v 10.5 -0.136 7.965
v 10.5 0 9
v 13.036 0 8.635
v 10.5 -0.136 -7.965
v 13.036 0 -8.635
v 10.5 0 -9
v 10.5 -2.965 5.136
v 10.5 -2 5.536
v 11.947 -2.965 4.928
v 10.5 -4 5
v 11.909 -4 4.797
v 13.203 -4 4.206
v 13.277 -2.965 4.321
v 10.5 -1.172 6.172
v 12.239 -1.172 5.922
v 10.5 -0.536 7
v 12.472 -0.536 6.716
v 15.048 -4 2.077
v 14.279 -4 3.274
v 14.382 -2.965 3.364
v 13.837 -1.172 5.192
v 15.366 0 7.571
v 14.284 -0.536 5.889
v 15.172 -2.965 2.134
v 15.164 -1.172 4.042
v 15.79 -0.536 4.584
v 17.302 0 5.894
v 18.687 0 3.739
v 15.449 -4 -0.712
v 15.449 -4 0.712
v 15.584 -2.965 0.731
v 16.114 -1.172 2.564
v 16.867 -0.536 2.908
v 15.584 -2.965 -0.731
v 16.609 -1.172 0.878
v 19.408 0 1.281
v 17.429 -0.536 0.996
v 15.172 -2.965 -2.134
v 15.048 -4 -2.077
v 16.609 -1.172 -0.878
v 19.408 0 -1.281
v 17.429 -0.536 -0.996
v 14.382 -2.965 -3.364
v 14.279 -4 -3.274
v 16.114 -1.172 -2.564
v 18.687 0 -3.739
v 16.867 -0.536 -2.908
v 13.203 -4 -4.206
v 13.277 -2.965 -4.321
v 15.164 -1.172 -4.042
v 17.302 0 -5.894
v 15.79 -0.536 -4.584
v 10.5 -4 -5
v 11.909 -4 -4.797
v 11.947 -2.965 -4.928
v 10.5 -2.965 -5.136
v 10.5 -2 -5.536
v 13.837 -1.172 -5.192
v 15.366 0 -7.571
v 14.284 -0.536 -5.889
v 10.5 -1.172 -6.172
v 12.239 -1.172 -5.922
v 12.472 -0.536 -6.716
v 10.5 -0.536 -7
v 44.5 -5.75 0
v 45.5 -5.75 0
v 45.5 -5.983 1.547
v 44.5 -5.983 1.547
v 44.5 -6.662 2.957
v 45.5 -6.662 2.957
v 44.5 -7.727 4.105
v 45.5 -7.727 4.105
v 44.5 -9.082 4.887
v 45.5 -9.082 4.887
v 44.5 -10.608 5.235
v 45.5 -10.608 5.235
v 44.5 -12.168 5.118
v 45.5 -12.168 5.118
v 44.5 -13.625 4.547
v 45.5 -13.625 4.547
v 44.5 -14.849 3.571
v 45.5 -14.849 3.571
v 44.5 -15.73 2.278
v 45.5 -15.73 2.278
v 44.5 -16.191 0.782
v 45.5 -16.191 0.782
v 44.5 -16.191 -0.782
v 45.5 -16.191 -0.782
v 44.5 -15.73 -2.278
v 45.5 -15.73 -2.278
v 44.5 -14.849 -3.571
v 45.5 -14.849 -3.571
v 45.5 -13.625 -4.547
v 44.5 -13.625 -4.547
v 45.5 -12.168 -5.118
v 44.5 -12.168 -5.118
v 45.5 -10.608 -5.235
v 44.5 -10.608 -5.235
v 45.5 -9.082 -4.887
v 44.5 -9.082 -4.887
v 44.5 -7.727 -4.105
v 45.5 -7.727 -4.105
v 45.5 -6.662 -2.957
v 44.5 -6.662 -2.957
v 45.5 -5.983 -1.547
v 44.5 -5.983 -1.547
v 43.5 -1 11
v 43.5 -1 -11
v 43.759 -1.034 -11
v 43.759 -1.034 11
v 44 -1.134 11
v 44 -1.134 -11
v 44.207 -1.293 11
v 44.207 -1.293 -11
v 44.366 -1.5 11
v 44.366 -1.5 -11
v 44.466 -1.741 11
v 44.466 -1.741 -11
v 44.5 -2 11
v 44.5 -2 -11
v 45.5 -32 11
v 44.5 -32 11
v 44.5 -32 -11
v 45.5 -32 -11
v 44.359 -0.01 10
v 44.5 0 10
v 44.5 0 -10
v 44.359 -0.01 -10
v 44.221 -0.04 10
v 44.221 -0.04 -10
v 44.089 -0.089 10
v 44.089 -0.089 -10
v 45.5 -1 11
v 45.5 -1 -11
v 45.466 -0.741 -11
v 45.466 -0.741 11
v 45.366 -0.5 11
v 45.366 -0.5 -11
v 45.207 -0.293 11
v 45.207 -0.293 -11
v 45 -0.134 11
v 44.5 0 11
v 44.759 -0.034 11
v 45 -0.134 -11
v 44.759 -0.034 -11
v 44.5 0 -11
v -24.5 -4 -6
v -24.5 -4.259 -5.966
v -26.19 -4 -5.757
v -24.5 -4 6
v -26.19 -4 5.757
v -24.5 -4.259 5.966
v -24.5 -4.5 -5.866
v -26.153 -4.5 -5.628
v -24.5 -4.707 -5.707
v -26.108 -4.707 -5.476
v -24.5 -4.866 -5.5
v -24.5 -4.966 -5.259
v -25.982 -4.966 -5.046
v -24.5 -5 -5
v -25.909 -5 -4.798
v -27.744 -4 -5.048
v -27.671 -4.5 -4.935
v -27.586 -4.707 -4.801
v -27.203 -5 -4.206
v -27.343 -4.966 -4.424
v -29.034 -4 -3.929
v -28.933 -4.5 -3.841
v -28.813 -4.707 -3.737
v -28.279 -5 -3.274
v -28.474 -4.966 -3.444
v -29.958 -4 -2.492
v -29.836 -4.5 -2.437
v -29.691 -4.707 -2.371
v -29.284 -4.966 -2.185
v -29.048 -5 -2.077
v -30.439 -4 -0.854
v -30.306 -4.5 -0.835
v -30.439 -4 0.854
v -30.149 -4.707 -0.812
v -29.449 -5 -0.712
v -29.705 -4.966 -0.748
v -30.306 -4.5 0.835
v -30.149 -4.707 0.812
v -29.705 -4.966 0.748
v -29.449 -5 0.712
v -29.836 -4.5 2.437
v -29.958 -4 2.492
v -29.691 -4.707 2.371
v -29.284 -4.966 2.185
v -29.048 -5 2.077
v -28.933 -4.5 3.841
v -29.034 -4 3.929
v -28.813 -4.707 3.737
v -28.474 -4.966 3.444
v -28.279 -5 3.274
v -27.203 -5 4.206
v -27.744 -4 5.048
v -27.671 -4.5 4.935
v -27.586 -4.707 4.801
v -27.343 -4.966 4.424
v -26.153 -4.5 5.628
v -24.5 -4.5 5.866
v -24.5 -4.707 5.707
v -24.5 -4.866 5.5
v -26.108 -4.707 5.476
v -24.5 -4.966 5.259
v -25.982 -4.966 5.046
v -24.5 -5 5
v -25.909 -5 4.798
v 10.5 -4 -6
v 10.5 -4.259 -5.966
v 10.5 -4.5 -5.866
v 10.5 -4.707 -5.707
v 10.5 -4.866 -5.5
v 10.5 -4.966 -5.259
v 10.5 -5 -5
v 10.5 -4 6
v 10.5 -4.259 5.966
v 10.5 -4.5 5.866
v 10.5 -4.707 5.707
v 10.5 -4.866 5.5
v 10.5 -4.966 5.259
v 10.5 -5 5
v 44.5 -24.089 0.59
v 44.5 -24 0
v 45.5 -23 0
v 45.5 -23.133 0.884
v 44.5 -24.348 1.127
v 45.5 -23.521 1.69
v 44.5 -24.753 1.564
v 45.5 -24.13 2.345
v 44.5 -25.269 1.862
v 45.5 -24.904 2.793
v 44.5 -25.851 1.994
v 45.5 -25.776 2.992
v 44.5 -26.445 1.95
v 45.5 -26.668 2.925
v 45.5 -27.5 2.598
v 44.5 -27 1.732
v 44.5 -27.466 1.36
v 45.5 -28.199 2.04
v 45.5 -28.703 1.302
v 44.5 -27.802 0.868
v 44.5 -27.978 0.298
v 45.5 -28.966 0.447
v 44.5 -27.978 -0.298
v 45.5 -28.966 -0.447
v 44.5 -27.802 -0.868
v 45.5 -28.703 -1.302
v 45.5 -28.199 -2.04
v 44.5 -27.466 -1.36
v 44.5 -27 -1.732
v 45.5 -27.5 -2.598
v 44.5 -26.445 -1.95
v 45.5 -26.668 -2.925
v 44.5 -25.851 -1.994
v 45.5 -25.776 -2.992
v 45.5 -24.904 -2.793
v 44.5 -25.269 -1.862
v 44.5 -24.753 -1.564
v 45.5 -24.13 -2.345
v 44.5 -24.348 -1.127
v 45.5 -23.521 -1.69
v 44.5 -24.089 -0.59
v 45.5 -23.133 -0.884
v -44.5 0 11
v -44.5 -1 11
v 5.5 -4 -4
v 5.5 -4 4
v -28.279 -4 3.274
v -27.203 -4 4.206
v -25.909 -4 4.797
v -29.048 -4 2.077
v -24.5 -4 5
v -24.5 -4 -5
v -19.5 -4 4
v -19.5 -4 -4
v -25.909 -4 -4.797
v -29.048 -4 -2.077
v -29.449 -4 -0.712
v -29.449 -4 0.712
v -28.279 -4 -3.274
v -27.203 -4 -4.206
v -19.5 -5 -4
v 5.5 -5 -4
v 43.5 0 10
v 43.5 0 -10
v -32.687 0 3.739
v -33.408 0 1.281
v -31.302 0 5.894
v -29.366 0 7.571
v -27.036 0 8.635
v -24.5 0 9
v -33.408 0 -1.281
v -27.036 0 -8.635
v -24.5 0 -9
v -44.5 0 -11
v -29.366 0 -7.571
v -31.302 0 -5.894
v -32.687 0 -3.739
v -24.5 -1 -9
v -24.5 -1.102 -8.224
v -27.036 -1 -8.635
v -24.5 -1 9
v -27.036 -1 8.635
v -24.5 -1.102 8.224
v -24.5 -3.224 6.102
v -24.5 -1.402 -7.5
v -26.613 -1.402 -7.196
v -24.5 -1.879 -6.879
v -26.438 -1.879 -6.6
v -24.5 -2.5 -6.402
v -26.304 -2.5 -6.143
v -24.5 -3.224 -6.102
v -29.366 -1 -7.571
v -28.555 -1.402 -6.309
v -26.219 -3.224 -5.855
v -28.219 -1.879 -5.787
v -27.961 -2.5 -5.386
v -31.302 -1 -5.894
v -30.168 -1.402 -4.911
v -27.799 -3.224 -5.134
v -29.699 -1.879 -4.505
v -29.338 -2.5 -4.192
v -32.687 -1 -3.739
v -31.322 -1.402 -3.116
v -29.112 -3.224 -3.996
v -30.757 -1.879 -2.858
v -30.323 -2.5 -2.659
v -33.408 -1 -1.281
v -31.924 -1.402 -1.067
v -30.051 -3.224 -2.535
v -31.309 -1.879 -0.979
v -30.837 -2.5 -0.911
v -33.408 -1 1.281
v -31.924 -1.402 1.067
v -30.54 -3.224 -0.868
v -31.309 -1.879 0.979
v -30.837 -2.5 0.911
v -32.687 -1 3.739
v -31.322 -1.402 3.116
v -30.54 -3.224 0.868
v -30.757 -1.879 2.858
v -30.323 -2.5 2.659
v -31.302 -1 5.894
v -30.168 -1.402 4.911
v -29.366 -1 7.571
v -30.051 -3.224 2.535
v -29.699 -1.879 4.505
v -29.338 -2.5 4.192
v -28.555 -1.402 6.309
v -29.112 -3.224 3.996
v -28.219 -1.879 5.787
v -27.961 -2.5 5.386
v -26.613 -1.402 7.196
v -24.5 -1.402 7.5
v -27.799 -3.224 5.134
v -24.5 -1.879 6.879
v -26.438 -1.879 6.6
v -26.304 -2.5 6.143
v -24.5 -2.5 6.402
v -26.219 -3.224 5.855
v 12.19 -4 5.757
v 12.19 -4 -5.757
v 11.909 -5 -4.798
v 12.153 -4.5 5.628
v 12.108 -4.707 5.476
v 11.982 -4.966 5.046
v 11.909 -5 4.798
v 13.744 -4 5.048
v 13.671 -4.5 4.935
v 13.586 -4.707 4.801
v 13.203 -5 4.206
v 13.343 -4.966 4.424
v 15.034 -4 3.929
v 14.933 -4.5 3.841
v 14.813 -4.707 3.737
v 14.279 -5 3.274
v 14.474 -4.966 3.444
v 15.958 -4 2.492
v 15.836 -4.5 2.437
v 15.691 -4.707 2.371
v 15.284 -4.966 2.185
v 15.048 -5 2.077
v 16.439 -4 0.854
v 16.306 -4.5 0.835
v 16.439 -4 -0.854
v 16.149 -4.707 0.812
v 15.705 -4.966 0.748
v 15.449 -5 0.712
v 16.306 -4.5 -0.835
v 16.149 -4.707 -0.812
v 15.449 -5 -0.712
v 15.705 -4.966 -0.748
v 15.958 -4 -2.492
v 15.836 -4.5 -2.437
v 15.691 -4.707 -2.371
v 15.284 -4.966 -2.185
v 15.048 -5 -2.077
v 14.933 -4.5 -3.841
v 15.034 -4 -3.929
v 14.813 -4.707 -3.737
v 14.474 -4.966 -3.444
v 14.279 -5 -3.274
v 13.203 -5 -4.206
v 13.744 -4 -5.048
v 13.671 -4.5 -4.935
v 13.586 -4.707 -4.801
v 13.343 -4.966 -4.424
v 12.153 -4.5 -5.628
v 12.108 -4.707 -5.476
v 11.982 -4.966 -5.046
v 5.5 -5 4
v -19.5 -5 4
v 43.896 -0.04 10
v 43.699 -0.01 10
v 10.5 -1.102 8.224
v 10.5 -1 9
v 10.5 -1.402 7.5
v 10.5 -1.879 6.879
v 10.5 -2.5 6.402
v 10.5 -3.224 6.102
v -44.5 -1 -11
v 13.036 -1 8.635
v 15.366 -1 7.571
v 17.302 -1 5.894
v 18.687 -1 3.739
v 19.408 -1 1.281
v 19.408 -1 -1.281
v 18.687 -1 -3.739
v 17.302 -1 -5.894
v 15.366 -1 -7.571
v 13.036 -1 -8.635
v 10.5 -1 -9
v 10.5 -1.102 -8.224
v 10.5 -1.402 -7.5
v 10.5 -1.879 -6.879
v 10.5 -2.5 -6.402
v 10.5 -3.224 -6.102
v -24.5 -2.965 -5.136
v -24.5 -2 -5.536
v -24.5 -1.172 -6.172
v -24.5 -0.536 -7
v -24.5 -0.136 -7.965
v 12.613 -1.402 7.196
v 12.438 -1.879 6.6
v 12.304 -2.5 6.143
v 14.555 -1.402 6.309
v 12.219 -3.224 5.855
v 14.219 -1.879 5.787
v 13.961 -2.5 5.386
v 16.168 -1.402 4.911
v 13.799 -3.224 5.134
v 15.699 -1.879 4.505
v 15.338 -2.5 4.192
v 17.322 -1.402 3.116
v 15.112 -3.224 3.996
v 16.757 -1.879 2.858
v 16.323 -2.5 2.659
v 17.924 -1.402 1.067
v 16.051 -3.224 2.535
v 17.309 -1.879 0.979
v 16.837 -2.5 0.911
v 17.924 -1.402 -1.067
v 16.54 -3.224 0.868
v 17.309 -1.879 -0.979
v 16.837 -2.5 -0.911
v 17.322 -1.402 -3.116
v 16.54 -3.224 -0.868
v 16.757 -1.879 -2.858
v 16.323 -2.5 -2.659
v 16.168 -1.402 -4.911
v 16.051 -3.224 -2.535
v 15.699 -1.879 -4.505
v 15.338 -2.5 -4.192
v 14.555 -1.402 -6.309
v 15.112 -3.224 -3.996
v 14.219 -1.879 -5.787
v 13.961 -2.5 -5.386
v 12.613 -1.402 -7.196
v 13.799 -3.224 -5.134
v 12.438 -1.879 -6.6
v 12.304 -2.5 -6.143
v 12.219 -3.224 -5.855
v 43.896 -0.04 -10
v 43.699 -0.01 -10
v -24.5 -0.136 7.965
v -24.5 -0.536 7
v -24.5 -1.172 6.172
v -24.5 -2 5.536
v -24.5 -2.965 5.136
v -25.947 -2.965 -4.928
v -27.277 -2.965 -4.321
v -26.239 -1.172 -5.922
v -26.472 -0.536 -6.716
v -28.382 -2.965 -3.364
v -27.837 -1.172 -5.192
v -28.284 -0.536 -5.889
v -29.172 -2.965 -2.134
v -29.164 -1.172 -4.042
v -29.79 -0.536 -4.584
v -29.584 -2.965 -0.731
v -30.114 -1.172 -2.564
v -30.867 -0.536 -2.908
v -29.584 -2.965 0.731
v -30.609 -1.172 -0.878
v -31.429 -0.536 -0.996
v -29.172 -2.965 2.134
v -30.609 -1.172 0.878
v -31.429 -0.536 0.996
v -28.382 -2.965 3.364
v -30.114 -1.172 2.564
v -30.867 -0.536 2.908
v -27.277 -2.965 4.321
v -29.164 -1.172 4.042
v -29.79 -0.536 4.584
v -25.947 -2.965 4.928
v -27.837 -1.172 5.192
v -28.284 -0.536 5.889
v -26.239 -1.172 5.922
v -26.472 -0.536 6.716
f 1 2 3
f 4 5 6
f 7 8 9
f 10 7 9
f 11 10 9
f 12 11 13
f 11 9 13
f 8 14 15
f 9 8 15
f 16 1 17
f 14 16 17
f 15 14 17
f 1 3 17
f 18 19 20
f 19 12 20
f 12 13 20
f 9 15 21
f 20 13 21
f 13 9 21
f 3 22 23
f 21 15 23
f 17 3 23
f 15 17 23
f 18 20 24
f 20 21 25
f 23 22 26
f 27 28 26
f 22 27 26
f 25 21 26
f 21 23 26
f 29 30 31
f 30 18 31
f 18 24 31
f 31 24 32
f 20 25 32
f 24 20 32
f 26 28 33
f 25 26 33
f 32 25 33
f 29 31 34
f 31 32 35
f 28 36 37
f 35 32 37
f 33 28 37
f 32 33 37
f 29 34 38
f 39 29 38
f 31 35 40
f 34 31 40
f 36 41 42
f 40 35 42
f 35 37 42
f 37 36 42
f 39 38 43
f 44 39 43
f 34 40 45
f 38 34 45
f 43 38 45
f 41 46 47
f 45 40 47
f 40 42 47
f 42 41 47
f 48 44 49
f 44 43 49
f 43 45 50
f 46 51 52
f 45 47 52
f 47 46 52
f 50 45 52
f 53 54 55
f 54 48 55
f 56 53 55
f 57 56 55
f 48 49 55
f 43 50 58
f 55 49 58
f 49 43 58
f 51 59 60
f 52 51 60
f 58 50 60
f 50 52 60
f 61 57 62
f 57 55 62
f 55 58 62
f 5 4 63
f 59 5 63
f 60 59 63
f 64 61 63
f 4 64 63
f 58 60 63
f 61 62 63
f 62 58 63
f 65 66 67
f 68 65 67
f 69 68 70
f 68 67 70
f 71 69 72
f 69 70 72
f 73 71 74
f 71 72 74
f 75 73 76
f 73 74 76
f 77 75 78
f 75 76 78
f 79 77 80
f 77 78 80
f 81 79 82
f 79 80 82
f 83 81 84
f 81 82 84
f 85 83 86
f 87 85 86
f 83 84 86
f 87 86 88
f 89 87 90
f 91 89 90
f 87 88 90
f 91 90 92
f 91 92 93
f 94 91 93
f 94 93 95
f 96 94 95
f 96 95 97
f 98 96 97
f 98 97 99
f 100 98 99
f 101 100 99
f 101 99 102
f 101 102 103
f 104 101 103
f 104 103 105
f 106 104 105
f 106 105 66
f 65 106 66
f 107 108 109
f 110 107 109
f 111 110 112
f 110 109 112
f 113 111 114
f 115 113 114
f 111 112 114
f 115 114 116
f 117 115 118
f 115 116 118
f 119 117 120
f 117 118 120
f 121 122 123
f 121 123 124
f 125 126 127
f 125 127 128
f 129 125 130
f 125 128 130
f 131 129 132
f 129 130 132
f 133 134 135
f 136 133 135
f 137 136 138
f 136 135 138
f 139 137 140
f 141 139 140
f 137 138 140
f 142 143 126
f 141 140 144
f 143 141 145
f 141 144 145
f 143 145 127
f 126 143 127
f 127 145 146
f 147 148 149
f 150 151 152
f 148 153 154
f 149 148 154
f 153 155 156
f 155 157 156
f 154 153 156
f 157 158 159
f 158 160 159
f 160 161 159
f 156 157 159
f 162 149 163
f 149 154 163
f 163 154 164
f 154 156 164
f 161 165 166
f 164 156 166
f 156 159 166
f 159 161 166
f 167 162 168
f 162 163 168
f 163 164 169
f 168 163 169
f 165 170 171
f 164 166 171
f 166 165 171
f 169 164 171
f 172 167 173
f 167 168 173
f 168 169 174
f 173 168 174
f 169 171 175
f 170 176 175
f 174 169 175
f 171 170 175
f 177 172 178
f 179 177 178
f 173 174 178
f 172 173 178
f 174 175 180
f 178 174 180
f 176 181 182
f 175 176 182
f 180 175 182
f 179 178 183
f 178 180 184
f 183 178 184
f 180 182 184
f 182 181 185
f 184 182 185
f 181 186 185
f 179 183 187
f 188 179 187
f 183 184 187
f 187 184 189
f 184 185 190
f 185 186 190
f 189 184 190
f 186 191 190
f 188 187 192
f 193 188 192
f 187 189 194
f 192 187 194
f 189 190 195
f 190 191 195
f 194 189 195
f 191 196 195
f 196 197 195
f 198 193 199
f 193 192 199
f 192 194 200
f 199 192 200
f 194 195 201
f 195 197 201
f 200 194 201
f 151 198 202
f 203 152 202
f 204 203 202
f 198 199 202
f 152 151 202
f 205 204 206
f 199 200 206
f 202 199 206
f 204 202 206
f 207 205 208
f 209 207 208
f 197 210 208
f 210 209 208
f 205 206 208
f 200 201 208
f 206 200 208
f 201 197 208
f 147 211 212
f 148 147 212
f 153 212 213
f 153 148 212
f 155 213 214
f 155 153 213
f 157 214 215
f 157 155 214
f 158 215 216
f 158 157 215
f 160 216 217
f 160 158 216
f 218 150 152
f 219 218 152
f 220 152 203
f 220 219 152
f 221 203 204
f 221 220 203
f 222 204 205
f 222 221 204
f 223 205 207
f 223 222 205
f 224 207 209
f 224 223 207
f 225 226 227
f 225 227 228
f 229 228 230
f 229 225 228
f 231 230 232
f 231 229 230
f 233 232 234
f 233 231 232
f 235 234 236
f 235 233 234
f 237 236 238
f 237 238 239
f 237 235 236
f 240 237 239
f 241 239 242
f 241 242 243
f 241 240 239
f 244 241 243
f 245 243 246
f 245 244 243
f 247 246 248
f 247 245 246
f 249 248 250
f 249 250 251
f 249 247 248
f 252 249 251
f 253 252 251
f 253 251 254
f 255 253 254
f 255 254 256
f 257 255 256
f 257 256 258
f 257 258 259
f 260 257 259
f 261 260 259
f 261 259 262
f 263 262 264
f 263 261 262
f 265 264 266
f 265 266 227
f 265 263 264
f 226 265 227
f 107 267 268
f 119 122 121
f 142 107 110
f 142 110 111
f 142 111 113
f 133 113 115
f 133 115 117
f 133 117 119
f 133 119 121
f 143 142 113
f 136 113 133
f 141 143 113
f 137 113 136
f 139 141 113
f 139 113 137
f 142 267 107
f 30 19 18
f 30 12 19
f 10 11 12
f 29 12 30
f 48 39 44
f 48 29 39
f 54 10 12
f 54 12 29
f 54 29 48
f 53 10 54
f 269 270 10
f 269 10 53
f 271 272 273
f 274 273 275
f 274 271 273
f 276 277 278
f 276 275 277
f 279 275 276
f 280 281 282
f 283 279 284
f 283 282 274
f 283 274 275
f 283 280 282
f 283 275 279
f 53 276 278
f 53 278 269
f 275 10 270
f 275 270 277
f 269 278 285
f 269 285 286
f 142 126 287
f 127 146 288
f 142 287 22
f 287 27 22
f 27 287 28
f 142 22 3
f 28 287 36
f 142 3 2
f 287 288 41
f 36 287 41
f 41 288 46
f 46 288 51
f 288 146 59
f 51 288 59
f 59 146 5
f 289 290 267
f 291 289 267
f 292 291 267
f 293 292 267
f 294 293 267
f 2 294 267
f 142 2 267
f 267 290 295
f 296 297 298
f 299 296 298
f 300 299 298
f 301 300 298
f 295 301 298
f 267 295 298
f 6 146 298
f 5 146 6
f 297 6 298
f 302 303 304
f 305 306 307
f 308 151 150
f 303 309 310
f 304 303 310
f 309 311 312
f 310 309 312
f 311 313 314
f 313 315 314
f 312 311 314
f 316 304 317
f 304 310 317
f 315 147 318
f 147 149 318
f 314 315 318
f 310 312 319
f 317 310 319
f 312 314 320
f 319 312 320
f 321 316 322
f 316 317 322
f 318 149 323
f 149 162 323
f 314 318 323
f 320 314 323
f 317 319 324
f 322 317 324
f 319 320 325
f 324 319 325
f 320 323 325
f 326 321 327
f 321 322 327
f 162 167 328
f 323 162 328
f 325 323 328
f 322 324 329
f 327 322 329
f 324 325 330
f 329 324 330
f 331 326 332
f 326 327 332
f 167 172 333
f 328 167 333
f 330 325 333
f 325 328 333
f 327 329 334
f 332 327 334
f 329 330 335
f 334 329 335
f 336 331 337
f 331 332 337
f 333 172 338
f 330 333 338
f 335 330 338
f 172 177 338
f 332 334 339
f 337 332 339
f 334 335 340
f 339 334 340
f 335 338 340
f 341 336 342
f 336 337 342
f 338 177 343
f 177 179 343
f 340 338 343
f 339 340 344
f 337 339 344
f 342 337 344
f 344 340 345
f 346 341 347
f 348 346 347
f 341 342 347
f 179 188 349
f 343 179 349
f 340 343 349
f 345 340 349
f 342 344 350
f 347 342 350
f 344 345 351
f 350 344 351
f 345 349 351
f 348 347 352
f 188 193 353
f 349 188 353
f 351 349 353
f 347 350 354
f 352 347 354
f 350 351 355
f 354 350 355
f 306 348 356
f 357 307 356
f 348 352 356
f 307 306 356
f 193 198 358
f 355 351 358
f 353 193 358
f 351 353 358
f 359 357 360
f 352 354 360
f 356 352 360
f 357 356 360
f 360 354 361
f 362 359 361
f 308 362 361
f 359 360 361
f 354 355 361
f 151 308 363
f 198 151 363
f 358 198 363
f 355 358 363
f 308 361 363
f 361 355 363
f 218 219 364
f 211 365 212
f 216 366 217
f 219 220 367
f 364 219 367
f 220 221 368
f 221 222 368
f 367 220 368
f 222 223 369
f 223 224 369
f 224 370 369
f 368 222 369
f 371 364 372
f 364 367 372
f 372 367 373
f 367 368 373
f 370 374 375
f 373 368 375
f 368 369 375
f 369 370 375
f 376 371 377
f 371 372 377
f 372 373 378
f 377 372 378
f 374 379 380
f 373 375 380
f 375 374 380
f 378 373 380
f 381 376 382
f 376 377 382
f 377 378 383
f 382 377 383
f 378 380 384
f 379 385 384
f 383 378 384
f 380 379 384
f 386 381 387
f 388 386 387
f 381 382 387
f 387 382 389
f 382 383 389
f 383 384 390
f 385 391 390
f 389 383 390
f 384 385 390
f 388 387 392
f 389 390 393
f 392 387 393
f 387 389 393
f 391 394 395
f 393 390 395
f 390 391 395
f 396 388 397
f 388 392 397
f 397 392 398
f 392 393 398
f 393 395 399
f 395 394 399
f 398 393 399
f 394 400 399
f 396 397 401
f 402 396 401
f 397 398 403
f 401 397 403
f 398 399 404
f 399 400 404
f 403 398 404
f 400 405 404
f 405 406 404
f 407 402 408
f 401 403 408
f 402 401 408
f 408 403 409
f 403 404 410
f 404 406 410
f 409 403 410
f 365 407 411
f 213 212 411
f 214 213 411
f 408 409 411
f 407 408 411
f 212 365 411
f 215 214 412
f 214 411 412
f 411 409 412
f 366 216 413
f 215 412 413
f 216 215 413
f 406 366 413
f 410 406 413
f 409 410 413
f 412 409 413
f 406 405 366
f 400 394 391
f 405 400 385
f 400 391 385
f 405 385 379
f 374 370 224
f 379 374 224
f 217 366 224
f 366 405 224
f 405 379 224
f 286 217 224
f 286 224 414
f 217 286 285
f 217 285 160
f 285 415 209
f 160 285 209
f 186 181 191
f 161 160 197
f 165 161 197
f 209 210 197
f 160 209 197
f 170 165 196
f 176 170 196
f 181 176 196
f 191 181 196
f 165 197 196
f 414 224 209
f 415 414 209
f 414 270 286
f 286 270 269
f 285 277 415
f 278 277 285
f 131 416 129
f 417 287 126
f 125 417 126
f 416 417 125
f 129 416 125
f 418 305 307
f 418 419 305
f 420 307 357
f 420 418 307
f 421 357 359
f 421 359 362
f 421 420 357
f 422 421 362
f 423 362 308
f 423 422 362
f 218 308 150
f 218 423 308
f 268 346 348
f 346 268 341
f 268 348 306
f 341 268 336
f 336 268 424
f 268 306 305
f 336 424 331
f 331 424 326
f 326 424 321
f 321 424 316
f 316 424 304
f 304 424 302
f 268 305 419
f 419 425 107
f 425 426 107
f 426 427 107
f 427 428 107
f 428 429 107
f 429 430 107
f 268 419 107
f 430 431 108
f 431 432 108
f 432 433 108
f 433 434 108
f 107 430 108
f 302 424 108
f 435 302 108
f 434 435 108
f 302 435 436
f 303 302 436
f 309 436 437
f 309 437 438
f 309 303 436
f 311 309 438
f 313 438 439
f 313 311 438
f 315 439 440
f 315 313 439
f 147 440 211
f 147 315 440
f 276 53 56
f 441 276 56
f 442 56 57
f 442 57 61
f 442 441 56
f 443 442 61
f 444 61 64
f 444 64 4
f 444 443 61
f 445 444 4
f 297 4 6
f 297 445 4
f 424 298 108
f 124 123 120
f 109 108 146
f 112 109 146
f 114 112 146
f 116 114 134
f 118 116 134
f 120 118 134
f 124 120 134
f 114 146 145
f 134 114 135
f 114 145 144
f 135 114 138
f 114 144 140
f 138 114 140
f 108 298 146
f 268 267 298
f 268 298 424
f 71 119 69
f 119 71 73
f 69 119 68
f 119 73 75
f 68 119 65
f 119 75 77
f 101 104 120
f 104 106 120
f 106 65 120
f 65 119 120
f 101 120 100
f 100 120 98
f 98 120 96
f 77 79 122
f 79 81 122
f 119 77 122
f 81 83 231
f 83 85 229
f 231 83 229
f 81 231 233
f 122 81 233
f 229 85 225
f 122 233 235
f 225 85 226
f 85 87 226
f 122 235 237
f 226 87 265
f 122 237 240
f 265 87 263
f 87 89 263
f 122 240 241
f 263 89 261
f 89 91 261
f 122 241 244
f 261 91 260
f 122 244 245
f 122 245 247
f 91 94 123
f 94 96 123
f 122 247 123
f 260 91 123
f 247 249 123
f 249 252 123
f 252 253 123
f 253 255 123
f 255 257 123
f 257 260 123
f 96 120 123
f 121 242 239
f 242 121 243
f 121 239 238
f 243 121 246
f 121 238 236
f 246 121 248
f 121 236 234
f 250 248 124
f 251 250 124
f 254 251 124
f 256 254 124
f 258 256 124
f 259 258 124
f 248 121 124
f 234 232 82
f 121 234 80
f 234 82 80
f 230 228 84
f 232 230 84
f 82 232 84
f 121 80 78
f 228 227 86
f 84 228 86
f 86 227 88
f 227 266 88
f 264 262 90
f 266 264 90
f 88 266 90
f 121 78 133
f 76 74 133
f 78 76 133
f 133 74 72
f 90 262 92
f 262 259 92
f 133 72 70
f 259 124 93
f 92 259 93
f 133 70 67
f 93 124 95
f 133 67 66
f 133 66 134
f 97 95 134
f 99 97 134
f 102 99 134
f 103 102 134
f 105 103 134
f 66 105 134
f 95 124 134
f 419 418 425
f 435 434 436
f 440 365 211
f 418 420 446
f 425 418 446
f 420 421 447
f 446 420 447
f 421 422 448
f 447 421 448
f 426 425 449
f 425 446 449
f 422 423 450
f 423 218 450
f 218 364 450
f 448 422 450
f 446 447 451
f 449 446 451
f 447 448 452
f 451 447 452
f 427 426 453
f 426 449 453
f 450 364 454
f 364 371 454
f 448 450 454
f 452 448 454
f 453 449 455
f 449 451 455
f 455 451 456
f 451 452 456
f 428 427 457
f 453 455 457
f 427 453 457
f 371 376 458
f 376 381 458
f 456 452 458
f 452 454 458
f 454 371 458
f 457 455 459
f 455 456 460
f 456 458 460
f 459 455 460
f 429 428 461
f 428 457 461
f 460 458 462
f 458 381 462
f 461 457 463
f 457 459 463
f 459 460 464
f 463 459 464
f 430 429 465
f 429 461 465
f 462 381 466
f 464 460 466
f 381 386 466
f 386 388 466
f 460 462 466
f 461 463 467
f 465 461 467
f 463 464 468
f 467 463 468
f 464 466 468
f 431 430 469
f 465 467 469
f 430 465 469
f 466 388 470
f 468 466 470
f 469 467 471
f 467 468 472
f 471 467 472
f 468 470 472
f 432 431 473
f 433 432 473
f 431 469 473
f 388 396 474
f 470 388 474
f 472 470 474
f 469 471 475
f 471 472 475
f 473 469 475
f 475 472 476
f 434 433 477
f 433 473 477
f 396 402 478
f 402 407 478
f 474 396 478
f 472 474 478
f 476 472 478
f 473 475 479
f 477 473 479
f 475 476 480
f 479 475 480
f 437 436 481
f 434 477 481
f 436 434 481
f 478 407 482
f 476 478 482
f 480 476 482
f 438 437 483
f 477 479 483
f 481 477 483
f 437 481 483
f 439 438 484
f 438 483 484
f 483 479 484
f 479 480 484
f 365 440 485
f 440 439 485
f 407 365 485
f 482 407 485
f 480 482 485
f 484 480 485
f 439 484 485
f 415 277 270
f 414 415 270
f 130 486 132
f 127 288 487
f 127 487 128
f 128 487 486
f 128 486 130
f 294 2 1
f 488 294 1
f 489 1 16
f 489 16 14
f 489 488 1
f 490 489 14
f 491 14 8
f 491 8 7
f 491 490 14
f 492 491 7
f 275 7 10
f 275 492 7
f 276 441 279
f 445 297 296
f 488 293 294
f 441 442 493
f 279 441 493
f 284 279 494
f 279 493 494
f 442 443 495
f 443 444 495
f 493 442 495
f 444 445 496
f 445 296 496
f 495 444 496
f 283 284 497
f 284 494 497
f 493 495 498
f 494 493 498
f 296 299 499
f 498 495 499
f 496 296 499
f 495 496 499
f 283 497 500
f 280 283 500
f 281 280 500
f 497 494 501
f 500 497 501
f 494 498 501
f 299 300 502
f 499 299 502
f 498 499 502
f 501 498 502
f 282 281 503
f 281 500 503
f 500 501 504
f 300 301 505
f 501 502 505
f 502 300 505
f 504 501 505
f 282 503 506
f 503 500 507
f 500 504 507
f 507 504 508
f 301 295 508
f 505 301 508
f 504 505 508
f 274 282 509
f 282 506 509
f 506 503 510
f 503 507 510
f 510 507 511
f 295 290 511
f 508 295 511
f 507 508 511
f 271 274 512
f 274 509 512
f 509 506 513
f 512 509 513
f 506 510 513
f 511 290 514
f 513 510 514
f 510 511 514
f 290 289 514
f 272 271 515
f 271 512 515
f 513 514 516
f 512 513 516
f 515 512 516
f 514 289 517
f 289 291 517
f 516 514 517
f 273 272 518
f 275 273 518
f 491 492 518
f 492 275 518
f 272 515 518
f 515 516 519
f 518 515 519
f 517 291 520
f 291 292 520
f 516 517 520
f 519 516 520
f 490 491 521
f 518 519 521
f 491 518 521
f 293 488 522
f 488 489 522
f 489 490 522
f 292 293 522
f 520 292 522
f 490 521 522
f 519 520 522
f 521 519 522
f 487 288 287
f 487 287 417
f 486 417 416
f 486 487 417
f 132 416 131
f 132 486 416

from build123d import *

# Parameters (mm, degrees)
BOSS_EXTRUDE1_DEPTH      = 11
BOSS_EXTRUDE1_DEPTH_BACK = 11
CUT_EXTRUDE1_REACH       = 98.151
SKETCH2_R                = 5.25
SKETCH2_R_2              = 2
BOSS_EXTRUDE2_DEPTH      = 4
FILLET1_R                = 3
FILLET2_R                = 1
SHELL1_START             = -24.5
SHELL1_DEPTH             = 35
SHELL1_START_2           = -10
SHELL1_2_DEPTH           = 20
CUT_EXTRUDE2_REACH       = 56.546
SKETCH4_W                = 25
SKETCH4_H                = 8
CHAMFER1_SIZE            = 1
DELETEFACE2_START        = -10
DELETEFACE2_DEPTH        = 20


with BuildPart() as part:
    # Sketch1 → Boss-Extrude1 (new, two sides: drawn at the far end of the back side and taken through both)
    with BuildSketch(Plane.XY.offset(-BOSS_EXTRUDE1_DEPTH_BACK)):
        with BuildLine():
            Line((-44.5, 0), (-44.5, -1))
            Line((-44.5, -1), (43.5, -1))
            ThreePointArc((43.5, -1), (44.207106781, -1.292893219), (44.5, -2))
            Line((44.5, -2), (44.5, -32))
            Line((44.5, -32), (45.5, -32))
            Line((45.5, -32), (45.5, -1))
            ThreePointArc((45.5, -1), (45.207106781, -0.292893219), (44.5, 0))
            Line((44.5, 0), (-44.5, 0))
        make_face()
    extrude(amount=BOSS_EXTRUDE1_DEPTH + BOSS_EXTRUDE1_DEPTH_BACK)

    # Sketch2 → Cut-Extrude1 (cut, up to next)
    with BuildSketch(Plane(origin=(45.5, 0, 0), x_dir=(0, 0, -1), z_dir=(1, 0, 0)), mode=Mode.PRIVATE) as cut_extrude1_sk1:
        with Locations(Location((0, -11, 0), (0, 0, 90))):
            Circle(SKETCH2_R)
    cut_extrude1_tool1 = extrude(cut_extrude1_sk1.sketch, amount=-CUT_EXTRUDE1_REACH, mode=Mode.PRIVATE) & part.part
    # Sketch2 → Cut-Extrude1 (cut, up to next)
    with BuildSketch(Plane(origin=(45.5, 0, 0), x_dir=(0, 0, -1), z_dir=(1, 0, 0)), mode=Mode.PRIVATE) as cut_extrude1_sk2:
        with Locations(Location((0, -26, 0), (0, 0, 90))):
            Circle(SKETCH2_R_2)
    cut_extrude1_tool2 = extrude(cut_extrude1_sk2.sketch, amount=-CUT_EXTRUDE1_REACH, mode=Mode.PRIVATE) & part.part
    add(cut_extrude1_tool1.solids().sort_by_distance((45.5, -11, 0))[0], mode=Mode.SUBTRACT)
    add(cut_extrude1_tool2.solids().sort_by_distance((45.5, -26, 0))[0], mode=Mode.SUBTRACT)

    # Sketch3 → Boss-Extrude2 (add)
    with BuildSketch(Plane.XZ.offset(1)):
        with BuildLine():
            Line((10.5, -6), (-24.5, -6))
            ThreePointArc((-24.5, -6), (-30.5, 0), (-24.5, 6))
            Line((-24.5, 6), (10.5, 6))
            ThreePointArc((10.5, 6), (16.5, 0), (10.5, -6))
        make_face()
    extrude(amount=BOSS_EXTRUDE2_DEPTH)

    # Fillet1
    fillet1_edges = [part.edges().sort_by_distance(p)[0] for p in [
        (16.5, -1, 0),
        (-7, -1, 6),
        (-30.5, -1, 0),
        (-7, -1, -6),
    ]]
    fillet(fillet1_edges, radius=FILLET1_R)

    # Fillet2
    fillet2_edges = [part.edges().sort_by_distance(p)[0] for p in [
        (16.5, -5, 0),
        (-7, -5, -6),
        (-30.5, -5, 0),
        (-7, -5, 6),
    ]]
    fillet(fillet2_edges, radius=FILLET2_R - 0.0001)  # a hair under: the kernel refuses the full size

    # Shell1: read off the stored shape, not the designer's step
    # Shell1 outline → Shell1 (cut)
    with BuildSketch(Plane.YZ.offset(SHELL1_START)):
        with BuildLine():
            Line((0, -9), (0, 9))
            ThreePointArc((0, 9), (-1.171572875, 6.171572875), (-4, 5))
            Line((-4, 5), (-4, -5))
            ThreePointArc((-4, -5), (-1.171572875, -6.171572875), (0, -9))
        make_face()
    extrude(amount=SHELL1_DEPTH, mode=Mode.SUBTRACT)

    # Shell1 2 outline → Shell1 2 (cut)
    with BuildSketch(Plane.XY.offset(SHELL1_START_2)):
        with BuildLine():
            ThreePointArc((43.5, 0), (44.01763809, -0.068148347), (44.5, -0.267949192))
            Line((44.5, -0.267949192), (44.5, 0))
            Line((44.5, 0), (43.5, 0))
        make_face()
    extrude(amount=SHELL1_2_DEPTH, mode=Mode.SUBTRACT)

    # Shell1 3 outline → Shell1 3 (revolve, cut)
    with BuildSketch(Plane(origin=(10.5, 0, 0), x_dir=(1, 0, 0), z_dir=(0, 0, 1))):
        with BuildLine():
            Line((9, 0), (0, 0))
            Line((0, 0), (0, -4))
            Line((0, -4), (5, -4))
            ThreePointArc((5, -4), (6.171572875, -1.171572875), (9, 0))
        make_face()
    revolve(axis=Axis((10.5, 0, 0), (0, 1, 0)), mode=Mode.SUBTRACT)

    # Shell1 4 outline → Shell1 4 (revolve, cut)
    with BuildSketch(Plane(origin=(-24.5, 0, 0), x_dir=(1, 0, 0), z_dir=(0, 0, 1))):
        with BuildLine():
            Line((9, 0), (0, 0))
            Line((0, 0), (0, -4))
            Line((0, -4), (5, -4))
            ThreePointArc((5, -4), (6.171572875, -1.171572875), (9, 0))
        make_face()
    revolve(axis=Axis((-24.5, 0, 0), (0, 1, 0)), mode=Mode.SUBTRACT)

    # Sketch4 → Cut-Extrude2 (cut, up to next)
    with BuildSketch(Plane(origin=(0, -4, 0), x_dir=(1, 0, 0), z_dir=(0, 1, 0)), mode=Mode.PRIVATE) as cut_extrude2_sk1:
        with Locations((-7, 0)):
            Rectangle(SKETCH4_W, SKETCH4_H)
    cut_extrude2_tool1 = extrude(cut_extrude2_sk1.sketch, amount=-CUT_EXTRUDE2_REACH, mode=Mode.PRIVATE) & part.part
    add(cut_extrude2_tool1.solids().sort_by_distance((-7, -4, 0))[0], mode=Mode.SUBTRACT)

    # Chamfer1
    chamfer1_edges = [part.edges().sort_by_distance(p)[0] for p in [
        (45.5, -28, 0),
    ]]
    chamfer(chamfer1_edges, length=CHAMFER1_SIZE - 0.0001)  # a hair under: the kernel refuses the full size

    # DeleteFace2: read off the stored shape, not the designer's step
    # DeleteFace2 outline → DeleteFace2 (add)
    with BuildSketch(Plane.XY.offset(DELETEFACE2_START)):
        with BuildLine():
            Line((44.5, -0.267949192), (44.5, 0))
            ThreePointArc((44.5, 0), (44.289569284, -0.022391226), (44.088562172, -0.088562172))
            ThreePointArc((44.088562172, -0.088562172), (44.299329325, -0.166677161), (44.5, -0.267949192))
        make_face()
    extrude(amount=DELETEFACE2_DEPTH)


solid = part.part
